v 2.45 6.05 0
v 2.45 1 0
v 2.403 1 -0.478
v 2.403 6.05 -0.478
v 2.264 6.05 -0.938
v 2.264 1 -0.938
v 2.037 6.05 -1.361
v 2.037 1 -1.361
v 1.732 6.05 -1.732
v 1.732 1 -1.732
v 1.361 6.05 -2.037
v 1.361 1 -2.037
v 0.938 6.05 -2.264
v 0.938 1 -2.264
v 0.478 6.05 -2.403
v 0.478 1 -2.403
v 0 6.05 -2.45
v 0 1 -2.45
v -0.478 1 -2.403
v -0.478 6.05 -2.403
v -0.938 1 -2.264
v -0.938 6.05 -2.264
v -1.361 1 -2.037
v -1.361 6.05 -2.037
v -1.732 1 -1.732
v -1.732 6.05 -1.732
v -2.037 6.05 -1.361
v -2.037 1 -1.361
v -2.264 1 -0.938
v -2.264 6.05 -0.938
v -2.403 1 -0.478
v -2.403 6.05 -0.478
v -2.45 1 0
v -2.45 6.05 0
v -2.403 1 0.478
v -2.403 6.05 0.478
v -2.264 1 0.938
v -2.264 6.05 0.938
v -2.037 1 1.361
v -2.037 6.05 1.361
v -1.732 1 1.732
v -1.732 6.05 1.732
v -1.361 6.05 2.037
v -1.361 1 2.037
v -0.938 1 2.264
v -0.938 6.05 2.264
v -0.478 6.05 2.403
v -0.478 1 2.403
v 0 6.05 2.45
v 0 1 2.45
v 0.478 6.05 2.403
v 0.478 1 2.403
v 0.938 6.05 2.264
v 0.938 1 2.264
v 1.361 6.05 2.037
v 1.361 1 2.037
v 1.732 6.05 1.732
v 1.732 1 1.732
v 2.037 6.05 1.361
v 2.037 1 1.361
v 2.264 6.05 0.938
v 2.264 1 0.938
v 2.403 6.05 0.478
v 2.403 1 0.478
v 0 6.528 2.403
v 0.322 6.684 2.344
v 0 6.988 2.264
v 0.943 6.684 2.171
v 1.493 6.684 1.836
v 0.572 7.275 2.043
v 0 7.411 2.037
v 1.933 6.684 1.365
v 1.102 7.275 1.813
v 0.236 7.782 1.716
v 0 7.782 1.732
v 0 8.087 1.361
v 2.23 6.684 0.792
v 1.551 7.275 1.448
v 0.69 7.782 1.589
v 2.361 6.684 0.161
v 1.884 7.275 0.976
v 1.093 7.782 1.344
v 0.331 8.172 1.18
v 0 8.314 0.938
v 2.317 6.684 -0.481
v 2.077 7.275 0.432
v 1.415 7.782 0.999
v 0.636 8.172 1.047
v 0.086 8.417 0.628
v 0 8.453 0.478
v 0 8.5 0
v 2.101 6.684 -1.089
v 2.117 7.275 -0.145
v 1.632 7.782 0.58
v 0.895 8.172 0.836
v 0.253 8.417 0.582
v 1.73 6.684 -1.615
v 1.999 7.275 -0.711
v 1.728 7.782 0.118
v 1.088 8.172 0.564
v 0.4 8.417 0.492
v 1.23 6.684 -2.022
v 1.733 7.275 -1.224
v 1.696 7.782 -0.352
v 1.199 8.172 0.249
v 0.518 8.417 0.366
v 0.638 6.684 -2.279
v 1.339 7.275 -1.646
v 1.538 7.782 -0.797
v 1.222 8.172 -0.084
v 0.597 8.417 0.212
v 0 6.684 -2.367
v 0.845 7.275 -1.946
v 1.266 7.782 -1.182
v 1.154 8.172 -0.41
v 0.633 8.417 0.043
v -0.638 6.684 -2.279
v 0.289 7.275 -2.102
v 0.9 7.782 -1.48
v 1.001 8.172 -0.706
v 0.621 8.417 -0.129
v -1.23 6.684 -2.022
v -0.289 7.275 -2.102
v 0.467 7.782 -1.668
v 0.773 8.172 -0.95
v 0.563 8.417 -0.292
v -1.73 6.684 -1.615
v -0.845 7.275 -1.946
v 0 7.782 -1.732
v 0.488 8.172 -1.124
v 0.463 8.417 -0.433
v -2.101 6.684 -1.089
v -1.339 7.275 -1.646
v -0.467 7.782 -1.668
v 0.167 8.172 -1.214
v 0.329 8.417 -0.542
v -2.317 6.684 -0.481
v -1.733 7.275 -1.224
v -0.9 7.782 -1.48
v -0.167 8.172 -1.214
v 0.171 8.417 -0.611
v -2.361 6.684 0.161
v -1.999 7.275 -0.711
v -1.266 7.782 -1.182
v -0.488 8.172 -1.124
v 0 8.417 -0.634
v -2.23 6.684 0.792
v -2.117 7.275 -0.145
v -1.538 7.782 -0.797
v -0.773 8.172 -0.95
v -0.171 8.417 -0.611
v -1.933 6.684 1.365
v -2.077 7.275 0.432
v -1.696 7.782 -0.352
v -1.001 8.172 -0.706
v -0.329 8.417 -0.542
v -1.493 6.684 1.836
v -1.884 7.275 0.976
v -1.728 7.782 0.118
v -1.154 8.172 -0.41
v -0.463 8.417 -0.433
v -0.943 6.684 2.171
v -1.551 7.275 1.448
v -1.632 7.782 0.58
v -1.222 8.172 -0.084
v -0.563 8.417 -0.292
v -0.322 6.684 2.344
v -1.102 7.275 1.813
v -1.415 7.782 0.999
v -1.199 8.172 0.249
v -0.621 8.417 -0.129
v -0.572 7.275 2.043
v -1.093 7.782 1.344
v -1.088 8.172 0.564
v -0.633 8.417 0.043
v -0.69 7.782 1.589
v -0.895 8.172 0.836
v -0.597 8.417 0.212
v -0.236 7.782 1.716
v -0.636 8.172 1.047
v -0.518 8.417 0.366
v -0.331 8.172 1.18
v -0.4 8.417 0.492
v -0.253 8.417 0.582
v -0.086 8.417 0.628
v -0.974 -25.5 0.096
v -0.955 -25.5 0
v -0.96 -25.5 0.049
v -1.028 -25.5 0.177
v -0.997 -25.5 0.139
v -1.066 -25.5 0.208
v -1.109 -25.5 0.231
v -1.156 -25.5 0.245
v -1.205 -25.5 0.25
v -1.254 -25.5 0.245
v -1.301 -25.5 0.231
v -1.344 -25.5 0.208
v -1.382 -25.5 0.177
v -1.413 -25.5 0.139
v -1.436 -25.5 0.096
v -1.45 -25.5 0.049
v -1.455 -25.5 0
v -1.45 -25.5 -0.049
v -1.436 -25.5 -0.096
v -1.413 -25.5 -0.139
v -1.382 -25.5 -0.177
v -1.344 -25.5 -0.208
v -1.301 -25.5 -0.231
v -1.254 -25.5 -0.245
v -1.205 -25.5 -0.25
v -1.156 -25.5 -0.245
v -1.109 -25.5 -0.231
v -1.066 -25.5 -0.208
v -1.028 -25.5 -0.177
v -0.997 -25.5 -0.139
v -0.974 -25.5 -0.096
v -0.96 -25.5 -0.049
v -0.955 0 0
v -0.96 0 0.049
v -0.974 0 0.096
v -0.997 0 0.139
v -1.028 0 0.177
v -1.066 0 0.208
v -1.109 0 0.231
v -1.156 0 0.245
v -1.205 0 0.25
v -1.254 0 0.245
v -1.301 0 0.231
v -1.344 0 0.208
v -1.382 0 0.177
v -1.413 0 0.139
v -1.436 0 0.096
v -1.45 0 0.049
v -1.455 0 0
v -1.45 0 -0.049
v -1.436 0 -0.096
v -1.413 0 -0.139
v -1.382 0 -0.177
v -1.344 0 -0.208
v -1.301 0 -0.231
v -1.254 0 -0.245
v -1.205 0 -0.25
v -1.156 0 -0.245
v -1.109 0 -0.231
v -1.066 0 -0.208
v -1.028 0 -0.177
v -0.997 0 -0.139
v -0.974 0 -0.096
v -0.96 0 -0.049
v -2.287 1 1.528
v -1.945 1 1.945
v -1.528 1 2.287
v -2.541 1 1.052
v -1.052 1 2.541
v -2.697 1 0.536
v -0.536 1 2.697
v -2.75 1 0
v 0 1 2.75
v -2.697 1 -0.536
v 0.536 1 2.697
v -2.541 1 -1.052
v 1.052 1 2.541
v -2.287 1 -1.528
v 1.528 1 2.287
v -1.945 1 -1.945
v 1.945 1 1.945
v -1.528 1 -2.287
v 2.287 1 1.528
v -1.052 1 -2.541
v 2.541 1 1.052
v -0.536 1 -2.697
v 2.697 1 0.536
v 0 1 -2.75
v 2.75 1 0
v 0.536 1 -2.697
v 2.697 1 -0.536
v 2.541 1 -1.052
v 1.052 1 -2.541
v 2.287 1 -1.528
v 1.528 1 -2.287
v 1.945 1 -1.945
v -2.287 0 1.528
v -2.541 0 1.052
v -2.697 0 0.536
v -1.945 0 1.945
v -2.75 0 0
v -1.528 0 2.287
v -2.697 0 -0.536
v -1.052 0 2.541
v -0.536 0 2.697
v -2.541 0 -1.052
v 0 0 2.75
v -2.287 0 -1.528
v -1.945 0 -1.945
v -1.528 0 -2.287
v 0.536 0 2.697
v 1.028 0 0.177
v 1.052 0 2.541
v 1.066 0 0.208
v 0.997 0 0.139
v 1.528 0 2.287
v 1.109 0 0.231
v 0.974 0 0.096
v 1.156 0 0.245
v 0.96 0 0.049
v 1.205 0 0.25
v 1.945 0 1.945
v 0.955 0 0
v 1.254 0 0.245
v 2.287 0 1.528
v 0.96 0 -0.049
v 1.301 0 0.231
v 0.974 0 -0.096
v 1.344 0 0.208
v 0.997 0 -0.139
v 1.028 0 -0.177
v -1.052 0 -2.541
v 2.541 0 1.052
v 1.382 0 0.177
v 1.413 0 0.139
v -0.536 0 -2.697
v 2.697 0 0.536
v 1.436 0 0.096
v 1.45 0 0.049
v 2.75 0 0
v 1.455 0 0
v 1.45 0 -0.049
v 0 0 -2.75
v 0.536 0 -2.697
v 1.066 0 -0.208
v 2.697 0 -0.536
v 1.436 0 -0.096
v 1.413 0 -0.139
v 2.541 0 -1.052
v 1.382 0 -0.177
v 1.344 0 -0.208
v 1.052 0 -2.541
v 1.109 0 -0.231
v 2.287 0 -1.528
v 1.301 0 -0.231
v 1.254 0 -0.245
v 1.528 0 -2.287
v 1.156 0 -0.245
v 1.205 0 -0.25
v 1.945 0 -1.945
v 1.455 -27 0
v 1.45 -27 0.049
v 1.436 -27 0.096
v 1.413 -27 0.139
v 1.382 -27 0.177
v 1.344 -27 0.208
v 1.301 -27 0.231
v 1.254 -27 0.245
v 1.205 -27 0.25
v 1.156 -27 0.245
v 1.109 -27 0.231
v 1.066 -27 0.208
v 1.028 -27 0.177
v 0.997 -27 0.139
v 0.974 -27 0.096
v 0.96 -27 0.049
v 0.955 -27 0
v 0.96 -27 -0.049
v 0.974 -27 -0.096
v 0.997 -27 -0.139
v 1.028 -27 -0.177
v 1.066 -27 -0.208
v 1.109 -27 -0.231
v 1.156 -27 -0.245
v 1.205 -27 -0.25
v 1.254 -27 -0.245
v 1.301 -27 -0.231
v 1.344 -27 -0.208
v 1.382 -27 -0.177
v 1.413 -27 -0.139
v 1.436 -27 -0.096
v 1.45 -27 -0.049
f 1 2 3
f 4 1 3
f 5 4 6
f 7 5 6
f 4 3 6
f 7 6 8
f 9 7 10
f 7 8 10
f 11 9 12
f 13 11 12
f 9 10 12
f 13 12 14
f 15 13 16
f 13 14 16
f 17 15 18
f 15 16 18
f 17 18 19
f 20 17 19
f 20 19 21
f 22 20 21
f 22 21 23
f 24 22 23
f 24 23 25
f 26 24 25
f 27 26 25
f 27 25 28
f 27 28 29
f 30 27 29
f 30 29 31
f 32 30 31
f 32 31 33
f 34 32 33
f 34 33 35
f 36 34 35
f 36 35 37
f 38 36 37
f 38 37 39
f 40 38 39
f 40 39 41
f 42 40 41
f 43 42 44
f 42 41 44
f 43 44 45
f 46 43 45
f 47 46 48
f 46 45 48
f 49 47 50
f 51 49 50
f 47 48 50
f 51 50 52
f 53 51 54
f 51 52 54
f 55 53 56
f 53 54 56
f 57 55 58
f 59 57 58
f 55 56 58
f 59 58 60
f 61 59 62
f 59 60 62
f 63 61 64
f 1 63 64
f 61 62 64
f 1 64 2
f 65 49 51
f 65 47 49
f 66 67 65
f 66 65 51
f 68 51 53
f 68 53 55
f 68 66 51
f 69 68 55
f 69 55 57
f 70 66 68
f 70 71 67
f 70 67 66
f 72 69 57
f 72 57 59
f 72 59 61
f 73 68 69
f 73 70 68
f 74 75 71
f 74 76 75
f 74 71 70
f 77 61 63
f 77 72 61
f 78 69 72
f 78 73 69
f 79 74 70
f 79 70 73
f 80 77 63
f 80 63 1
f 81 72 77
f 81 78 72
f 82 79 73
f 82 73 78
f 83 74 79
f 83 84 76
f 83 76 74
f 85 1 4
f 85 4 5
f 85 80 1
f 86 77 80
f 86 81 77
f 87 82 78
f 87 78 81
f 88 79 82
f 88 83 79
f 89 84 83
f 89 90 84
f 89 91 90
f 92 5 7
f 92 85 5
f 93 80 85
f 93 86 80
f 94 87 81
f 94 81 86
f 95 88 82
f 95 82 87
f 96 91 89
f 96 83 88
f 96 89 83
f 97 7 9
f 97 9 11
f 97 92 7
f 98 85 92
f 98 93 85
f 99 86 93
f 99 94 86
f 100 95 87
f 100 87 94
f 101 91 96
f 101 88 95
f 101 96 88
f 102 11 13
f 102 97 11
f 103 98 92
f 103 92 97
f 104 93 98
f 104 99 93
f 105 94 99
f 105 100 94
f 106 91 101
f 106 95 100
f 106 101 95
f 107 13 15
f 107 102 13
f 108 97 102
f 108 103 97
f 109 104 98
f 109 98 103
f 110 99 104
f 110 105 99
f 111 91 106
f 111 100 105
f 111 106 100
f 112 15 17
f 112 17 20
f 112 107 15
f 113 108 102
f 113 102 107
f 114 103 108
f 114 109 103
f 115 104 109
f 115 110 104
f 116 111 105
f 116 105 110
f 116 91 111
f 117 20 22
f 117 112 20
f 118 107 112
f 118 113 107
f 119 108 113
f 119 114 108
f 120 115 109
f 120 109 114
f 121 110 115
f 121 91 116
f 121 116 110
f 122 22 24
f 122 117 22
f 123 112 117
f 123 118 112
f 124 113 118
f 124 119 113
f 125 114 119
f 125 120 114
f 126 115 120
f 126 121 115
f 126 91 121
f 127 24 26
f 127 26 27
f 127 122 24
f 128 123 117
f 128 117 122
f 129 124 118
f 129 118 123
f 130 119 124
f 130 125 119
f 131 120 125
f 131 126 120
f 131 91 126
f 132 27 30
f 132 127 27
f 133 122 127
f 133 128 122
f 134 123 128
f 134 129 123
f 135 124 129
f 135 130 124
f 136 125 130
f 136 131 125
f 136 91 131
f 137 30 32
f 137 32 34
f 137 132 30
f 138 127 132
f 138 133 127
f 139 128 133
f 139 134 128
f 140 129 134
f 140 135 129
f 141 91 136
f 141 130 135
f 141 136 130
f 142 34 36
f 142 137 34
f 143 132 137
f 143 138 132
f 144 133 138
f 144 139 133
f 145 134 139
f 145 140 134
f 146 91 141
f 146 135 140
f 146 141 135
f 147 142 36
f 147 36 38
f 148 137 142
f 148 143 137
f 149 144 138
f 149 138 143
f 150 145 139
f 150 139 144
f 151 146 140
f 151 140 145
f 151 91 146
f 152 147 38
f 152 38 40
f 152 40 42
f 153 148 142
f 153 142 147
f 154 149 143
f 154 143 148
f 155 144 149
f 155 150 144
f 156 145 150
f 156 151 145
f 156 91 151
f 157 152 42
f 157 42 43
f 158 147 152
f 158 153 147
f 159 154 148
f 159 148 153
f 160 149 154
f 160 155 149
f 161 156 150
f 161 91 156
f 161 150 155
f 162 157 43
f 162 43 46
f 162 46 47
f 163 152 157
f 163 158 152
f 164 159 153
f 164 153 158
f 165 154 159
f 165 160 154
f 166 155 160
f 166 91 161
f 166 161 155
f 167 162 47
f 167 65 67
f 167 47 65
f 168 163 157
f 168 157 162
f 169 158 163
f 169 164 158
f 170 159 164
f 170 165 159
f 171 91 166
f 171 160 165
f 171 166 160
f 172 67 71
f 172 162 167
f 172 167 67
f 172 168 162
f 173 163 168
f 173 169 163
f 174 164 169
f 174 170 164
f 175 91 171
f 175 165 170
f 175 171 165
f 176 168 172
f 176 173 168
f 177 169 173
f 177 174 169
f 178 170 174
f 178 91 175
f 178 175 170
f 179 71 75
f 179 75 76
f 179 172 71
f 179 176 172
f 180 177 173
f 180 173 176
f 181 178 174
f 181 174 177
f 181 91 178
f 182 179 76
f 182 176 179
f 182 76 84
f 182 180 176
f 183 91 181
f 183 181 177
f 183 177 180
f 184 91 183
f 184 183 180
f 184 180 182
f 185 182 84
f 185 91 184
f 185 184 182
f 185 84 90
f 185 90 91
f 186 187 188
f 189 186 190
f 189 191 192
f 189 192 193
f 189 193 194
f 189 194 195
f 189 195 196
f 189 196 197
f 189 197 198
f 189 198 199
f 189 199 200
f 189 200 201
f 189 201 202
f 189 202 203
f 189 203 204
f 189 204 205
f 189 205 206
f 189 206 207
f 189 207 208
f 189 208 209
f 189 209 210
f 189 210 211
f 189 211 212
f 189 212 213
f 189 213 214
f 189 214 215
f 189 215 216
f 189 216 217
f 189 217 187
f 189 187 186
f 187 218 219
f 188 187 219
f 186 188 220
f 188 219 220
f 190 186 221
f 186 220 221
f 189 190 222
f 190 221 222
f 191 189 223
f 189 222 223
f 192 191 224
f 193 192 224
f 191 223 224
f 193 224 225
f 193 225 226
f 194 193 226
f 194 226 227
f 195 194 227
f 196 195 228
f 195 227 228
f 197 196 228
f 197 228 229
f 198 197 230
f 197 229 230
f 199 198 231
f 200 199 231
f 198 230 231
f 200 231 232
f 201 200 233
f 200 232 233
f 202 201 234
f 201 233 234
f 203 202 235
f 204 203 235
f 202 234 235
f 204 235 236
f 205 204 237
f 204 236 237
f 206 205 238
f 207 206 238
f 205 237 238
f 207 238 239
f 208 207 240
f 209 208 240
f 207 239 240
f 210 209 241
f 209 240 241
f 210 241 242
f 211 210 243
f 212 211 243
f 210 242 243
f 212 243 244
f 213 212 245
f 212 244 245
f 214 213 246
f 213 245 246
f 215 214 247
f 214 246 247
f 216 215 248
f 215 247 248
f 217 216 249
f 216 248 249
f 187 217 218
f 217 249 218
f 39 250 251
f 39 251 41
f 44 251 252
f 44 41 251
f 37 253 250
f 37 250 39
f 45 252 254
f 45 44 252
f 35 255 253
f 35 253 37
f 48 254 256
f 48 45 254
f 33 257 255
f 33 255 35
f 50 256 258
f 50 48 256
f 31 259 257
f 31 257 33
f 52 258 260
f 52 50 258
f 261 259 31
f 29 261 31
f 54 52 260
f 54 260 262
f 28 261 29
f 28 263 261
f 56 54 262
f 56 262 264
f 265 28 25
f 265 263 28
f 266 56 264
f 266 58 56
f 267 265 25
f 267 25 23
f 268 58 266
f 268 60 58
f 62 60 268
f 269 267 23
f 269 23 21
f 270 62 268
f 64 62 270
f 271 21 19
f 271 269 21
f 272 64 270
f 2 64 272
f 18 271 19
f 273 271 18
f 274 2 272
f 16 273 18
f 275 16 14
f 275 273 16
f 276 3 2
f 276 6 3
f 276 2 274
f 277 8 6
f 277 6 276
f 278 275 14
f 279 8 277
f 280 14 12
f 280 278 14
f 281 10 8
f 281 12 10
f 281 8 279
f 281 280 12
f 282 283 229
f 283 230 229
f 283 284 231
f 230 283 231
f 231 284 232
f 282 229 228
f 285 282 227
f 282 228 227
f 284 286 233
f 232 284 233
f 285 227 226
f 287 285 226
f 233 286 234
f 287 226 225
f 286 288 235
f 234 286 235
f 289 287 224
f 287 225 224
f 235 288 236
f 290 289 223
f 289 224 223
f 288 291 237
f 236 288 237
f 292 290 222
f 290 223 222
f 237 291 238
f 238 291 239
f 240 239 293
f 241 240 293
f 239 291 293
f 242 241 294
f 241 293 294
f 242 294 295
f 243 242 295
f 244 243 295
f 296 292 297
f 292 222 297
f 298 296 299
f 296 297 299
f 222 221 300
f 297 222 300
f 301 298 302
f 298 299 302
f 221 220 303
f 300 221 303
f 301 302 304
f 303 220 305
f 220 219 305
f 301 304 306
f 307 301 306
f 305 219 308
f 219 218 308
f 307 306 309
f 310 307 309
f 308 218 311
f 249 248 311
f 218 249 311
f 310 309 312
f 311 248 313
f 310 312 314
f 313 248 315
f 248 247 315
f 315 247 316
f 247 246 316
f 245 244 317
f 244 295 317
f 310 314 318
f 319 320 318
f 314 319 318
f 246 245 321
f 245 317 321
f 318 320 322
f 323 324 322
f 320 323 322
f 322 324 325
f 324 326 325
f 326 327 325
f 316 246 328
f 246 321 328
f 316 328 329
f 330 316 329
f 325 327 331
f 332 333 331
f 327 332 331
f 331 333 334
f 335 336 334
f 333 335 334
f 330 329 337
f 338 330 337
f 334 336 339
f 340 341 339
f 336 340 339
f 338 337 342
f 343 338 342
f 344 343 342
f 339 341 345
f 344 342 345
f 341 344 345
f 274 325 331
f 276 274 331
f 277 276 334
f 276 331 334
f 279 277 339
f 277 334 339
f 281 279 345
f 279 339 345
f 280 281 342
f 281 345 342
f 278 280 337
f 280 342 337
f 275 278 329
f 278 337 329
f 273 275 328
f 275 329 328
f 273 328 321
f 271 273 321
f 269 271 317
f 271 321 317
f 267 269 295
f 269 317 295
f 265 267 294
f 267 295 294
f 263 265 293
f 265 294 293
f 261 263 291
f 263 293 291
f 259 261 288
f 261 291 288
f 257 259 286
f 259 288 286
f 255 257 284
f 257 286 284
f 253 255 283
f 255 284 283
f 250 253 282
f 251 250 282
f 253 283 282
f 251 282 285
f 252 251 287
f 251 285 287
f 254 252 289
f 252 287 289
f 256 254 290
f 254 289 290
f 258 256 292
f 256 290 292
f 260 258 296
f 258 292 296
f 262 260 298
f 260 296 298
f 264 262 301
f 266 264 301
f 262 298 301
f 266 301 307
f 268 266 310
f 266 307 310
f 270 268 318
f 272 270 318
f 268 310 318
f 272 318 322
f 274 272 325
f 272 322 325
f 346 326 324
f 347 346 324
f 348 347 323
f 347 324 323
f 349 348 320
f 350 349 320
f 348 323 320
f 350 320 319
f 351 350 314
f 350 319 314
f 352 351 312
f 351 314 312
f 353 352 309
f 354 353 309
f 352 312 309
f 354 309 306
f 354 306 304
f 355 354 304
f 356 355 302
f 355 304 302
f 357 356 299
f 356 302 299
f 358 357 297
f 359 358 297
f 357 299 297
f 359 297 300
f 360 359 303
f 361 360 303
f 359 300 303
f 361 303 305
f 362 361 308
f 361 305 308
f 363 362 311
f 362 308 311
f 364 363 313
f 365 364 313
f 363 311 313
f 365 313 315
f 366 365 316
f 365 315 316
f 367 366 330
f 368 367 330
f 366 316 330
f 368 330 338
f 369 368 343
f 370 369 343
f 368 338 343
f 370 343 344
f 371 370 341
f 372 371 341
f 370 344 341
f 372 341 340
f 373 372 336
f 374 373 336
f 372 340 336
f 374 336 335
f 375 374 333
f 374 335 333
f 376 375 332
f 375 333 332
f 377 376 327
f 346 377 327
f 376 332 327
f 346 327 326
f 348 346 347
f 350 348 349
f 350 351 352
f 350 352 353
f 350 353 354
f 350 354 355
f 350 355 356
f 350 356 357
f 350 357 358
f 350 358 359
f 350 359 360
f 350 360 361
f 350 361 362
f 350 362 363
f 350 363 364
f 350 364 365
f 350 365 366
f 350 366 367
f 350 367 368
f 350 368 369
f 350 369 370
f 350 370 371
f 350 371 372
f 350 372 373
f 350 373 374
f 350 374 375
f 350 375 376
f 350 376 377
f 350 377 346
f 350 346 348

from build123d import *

# Parameters (mm, degrees)
CROQUIS1_R              = 2.75
SALIENTE_EXTRUIR1_DEPTH = 1
CROQUIS2_R              = 2.45
SALIENTE_EXTRUIR2_DEPTH = 5.05
C_PULA1_FACE_RADIUS     = 2.45
C_PULA1_HEIGHT          = 2.45
CROQUIS3_R              = 0.25
SALIENTE_EXTRUIR3_DEPTH = 25.5
CROQUIS5_R              = 0.25
SALIENTE_EXTRUIR5_DEPTH = 27


with BuildPart() as part:
    # Croquis1 → Saliente-Extruir1 (new body)
    with BuildSketch(Plane(origin=(0, 0, 0), x_dir=(1, 0, 0), z_dir=(0, 1, 0))):
        Circle(CROQUIS1_R)
    extrude(amount=SALIENTE_EXTRUIR1_DEPTH)

    # Croquis2 → Saliente-Extruir2 (add)
    with BuildSketch(Plane(origin=(0, 1, 0), x_dir=(1, 0, 0), z_dir=(0, 1, 0))):
        Circle(CROQUIS2_R)
    extrude(amount=SALIENTE_EXTRUIR2_DEPTH)

    # C_pula1: a dome of height H over a round flat face of radius A is a cap of a sphere of radius (A * A + H * H) / (2 * H)
    c_pula1_r = (C_PULA1_FACE_RADIUS * C_PULA1_FACE_RADIUS + C_PULA1_HEIGHT * C_PULA1_HEIGHT) / (2 * C_PULA1_HEIGHT)
    c_pula1_base = Plane((0, 6.05, 0), z_dir=(0, 1, 0))
    with Locations(c_pula1_base.offset(C_PULA1_HEIGHT - c_pula1_r)):
        c_pula1_ball = Sphere(c_pula1_r, mode=Mode.PRIVATE)
    add(split(c_pula1_ball, bisect_by=c_pula1_base, keep=Keep.TOP, mode=Mode.PRIVATE))

    # Croquis3 → Saliente-Extruir3 (add)
    with BuildSketch(Plane.XZ):
        with Locations((-1.205162028, 0)):
            Circle(CROQUIS3_R)
    extrude(amount=SALIENTE_EXTRUIR3_DEPTH)

    # Croquis5 → Saliente-Extruir5 (add)
    with BuildSketch(Plane.XZ):
        with Locations((1.205162028, 0)):
            Circle(CROQUIS5_R)
    extrude(amount=SALIENTE_EXTRUIR5_DEPTH)


solid = part.part
